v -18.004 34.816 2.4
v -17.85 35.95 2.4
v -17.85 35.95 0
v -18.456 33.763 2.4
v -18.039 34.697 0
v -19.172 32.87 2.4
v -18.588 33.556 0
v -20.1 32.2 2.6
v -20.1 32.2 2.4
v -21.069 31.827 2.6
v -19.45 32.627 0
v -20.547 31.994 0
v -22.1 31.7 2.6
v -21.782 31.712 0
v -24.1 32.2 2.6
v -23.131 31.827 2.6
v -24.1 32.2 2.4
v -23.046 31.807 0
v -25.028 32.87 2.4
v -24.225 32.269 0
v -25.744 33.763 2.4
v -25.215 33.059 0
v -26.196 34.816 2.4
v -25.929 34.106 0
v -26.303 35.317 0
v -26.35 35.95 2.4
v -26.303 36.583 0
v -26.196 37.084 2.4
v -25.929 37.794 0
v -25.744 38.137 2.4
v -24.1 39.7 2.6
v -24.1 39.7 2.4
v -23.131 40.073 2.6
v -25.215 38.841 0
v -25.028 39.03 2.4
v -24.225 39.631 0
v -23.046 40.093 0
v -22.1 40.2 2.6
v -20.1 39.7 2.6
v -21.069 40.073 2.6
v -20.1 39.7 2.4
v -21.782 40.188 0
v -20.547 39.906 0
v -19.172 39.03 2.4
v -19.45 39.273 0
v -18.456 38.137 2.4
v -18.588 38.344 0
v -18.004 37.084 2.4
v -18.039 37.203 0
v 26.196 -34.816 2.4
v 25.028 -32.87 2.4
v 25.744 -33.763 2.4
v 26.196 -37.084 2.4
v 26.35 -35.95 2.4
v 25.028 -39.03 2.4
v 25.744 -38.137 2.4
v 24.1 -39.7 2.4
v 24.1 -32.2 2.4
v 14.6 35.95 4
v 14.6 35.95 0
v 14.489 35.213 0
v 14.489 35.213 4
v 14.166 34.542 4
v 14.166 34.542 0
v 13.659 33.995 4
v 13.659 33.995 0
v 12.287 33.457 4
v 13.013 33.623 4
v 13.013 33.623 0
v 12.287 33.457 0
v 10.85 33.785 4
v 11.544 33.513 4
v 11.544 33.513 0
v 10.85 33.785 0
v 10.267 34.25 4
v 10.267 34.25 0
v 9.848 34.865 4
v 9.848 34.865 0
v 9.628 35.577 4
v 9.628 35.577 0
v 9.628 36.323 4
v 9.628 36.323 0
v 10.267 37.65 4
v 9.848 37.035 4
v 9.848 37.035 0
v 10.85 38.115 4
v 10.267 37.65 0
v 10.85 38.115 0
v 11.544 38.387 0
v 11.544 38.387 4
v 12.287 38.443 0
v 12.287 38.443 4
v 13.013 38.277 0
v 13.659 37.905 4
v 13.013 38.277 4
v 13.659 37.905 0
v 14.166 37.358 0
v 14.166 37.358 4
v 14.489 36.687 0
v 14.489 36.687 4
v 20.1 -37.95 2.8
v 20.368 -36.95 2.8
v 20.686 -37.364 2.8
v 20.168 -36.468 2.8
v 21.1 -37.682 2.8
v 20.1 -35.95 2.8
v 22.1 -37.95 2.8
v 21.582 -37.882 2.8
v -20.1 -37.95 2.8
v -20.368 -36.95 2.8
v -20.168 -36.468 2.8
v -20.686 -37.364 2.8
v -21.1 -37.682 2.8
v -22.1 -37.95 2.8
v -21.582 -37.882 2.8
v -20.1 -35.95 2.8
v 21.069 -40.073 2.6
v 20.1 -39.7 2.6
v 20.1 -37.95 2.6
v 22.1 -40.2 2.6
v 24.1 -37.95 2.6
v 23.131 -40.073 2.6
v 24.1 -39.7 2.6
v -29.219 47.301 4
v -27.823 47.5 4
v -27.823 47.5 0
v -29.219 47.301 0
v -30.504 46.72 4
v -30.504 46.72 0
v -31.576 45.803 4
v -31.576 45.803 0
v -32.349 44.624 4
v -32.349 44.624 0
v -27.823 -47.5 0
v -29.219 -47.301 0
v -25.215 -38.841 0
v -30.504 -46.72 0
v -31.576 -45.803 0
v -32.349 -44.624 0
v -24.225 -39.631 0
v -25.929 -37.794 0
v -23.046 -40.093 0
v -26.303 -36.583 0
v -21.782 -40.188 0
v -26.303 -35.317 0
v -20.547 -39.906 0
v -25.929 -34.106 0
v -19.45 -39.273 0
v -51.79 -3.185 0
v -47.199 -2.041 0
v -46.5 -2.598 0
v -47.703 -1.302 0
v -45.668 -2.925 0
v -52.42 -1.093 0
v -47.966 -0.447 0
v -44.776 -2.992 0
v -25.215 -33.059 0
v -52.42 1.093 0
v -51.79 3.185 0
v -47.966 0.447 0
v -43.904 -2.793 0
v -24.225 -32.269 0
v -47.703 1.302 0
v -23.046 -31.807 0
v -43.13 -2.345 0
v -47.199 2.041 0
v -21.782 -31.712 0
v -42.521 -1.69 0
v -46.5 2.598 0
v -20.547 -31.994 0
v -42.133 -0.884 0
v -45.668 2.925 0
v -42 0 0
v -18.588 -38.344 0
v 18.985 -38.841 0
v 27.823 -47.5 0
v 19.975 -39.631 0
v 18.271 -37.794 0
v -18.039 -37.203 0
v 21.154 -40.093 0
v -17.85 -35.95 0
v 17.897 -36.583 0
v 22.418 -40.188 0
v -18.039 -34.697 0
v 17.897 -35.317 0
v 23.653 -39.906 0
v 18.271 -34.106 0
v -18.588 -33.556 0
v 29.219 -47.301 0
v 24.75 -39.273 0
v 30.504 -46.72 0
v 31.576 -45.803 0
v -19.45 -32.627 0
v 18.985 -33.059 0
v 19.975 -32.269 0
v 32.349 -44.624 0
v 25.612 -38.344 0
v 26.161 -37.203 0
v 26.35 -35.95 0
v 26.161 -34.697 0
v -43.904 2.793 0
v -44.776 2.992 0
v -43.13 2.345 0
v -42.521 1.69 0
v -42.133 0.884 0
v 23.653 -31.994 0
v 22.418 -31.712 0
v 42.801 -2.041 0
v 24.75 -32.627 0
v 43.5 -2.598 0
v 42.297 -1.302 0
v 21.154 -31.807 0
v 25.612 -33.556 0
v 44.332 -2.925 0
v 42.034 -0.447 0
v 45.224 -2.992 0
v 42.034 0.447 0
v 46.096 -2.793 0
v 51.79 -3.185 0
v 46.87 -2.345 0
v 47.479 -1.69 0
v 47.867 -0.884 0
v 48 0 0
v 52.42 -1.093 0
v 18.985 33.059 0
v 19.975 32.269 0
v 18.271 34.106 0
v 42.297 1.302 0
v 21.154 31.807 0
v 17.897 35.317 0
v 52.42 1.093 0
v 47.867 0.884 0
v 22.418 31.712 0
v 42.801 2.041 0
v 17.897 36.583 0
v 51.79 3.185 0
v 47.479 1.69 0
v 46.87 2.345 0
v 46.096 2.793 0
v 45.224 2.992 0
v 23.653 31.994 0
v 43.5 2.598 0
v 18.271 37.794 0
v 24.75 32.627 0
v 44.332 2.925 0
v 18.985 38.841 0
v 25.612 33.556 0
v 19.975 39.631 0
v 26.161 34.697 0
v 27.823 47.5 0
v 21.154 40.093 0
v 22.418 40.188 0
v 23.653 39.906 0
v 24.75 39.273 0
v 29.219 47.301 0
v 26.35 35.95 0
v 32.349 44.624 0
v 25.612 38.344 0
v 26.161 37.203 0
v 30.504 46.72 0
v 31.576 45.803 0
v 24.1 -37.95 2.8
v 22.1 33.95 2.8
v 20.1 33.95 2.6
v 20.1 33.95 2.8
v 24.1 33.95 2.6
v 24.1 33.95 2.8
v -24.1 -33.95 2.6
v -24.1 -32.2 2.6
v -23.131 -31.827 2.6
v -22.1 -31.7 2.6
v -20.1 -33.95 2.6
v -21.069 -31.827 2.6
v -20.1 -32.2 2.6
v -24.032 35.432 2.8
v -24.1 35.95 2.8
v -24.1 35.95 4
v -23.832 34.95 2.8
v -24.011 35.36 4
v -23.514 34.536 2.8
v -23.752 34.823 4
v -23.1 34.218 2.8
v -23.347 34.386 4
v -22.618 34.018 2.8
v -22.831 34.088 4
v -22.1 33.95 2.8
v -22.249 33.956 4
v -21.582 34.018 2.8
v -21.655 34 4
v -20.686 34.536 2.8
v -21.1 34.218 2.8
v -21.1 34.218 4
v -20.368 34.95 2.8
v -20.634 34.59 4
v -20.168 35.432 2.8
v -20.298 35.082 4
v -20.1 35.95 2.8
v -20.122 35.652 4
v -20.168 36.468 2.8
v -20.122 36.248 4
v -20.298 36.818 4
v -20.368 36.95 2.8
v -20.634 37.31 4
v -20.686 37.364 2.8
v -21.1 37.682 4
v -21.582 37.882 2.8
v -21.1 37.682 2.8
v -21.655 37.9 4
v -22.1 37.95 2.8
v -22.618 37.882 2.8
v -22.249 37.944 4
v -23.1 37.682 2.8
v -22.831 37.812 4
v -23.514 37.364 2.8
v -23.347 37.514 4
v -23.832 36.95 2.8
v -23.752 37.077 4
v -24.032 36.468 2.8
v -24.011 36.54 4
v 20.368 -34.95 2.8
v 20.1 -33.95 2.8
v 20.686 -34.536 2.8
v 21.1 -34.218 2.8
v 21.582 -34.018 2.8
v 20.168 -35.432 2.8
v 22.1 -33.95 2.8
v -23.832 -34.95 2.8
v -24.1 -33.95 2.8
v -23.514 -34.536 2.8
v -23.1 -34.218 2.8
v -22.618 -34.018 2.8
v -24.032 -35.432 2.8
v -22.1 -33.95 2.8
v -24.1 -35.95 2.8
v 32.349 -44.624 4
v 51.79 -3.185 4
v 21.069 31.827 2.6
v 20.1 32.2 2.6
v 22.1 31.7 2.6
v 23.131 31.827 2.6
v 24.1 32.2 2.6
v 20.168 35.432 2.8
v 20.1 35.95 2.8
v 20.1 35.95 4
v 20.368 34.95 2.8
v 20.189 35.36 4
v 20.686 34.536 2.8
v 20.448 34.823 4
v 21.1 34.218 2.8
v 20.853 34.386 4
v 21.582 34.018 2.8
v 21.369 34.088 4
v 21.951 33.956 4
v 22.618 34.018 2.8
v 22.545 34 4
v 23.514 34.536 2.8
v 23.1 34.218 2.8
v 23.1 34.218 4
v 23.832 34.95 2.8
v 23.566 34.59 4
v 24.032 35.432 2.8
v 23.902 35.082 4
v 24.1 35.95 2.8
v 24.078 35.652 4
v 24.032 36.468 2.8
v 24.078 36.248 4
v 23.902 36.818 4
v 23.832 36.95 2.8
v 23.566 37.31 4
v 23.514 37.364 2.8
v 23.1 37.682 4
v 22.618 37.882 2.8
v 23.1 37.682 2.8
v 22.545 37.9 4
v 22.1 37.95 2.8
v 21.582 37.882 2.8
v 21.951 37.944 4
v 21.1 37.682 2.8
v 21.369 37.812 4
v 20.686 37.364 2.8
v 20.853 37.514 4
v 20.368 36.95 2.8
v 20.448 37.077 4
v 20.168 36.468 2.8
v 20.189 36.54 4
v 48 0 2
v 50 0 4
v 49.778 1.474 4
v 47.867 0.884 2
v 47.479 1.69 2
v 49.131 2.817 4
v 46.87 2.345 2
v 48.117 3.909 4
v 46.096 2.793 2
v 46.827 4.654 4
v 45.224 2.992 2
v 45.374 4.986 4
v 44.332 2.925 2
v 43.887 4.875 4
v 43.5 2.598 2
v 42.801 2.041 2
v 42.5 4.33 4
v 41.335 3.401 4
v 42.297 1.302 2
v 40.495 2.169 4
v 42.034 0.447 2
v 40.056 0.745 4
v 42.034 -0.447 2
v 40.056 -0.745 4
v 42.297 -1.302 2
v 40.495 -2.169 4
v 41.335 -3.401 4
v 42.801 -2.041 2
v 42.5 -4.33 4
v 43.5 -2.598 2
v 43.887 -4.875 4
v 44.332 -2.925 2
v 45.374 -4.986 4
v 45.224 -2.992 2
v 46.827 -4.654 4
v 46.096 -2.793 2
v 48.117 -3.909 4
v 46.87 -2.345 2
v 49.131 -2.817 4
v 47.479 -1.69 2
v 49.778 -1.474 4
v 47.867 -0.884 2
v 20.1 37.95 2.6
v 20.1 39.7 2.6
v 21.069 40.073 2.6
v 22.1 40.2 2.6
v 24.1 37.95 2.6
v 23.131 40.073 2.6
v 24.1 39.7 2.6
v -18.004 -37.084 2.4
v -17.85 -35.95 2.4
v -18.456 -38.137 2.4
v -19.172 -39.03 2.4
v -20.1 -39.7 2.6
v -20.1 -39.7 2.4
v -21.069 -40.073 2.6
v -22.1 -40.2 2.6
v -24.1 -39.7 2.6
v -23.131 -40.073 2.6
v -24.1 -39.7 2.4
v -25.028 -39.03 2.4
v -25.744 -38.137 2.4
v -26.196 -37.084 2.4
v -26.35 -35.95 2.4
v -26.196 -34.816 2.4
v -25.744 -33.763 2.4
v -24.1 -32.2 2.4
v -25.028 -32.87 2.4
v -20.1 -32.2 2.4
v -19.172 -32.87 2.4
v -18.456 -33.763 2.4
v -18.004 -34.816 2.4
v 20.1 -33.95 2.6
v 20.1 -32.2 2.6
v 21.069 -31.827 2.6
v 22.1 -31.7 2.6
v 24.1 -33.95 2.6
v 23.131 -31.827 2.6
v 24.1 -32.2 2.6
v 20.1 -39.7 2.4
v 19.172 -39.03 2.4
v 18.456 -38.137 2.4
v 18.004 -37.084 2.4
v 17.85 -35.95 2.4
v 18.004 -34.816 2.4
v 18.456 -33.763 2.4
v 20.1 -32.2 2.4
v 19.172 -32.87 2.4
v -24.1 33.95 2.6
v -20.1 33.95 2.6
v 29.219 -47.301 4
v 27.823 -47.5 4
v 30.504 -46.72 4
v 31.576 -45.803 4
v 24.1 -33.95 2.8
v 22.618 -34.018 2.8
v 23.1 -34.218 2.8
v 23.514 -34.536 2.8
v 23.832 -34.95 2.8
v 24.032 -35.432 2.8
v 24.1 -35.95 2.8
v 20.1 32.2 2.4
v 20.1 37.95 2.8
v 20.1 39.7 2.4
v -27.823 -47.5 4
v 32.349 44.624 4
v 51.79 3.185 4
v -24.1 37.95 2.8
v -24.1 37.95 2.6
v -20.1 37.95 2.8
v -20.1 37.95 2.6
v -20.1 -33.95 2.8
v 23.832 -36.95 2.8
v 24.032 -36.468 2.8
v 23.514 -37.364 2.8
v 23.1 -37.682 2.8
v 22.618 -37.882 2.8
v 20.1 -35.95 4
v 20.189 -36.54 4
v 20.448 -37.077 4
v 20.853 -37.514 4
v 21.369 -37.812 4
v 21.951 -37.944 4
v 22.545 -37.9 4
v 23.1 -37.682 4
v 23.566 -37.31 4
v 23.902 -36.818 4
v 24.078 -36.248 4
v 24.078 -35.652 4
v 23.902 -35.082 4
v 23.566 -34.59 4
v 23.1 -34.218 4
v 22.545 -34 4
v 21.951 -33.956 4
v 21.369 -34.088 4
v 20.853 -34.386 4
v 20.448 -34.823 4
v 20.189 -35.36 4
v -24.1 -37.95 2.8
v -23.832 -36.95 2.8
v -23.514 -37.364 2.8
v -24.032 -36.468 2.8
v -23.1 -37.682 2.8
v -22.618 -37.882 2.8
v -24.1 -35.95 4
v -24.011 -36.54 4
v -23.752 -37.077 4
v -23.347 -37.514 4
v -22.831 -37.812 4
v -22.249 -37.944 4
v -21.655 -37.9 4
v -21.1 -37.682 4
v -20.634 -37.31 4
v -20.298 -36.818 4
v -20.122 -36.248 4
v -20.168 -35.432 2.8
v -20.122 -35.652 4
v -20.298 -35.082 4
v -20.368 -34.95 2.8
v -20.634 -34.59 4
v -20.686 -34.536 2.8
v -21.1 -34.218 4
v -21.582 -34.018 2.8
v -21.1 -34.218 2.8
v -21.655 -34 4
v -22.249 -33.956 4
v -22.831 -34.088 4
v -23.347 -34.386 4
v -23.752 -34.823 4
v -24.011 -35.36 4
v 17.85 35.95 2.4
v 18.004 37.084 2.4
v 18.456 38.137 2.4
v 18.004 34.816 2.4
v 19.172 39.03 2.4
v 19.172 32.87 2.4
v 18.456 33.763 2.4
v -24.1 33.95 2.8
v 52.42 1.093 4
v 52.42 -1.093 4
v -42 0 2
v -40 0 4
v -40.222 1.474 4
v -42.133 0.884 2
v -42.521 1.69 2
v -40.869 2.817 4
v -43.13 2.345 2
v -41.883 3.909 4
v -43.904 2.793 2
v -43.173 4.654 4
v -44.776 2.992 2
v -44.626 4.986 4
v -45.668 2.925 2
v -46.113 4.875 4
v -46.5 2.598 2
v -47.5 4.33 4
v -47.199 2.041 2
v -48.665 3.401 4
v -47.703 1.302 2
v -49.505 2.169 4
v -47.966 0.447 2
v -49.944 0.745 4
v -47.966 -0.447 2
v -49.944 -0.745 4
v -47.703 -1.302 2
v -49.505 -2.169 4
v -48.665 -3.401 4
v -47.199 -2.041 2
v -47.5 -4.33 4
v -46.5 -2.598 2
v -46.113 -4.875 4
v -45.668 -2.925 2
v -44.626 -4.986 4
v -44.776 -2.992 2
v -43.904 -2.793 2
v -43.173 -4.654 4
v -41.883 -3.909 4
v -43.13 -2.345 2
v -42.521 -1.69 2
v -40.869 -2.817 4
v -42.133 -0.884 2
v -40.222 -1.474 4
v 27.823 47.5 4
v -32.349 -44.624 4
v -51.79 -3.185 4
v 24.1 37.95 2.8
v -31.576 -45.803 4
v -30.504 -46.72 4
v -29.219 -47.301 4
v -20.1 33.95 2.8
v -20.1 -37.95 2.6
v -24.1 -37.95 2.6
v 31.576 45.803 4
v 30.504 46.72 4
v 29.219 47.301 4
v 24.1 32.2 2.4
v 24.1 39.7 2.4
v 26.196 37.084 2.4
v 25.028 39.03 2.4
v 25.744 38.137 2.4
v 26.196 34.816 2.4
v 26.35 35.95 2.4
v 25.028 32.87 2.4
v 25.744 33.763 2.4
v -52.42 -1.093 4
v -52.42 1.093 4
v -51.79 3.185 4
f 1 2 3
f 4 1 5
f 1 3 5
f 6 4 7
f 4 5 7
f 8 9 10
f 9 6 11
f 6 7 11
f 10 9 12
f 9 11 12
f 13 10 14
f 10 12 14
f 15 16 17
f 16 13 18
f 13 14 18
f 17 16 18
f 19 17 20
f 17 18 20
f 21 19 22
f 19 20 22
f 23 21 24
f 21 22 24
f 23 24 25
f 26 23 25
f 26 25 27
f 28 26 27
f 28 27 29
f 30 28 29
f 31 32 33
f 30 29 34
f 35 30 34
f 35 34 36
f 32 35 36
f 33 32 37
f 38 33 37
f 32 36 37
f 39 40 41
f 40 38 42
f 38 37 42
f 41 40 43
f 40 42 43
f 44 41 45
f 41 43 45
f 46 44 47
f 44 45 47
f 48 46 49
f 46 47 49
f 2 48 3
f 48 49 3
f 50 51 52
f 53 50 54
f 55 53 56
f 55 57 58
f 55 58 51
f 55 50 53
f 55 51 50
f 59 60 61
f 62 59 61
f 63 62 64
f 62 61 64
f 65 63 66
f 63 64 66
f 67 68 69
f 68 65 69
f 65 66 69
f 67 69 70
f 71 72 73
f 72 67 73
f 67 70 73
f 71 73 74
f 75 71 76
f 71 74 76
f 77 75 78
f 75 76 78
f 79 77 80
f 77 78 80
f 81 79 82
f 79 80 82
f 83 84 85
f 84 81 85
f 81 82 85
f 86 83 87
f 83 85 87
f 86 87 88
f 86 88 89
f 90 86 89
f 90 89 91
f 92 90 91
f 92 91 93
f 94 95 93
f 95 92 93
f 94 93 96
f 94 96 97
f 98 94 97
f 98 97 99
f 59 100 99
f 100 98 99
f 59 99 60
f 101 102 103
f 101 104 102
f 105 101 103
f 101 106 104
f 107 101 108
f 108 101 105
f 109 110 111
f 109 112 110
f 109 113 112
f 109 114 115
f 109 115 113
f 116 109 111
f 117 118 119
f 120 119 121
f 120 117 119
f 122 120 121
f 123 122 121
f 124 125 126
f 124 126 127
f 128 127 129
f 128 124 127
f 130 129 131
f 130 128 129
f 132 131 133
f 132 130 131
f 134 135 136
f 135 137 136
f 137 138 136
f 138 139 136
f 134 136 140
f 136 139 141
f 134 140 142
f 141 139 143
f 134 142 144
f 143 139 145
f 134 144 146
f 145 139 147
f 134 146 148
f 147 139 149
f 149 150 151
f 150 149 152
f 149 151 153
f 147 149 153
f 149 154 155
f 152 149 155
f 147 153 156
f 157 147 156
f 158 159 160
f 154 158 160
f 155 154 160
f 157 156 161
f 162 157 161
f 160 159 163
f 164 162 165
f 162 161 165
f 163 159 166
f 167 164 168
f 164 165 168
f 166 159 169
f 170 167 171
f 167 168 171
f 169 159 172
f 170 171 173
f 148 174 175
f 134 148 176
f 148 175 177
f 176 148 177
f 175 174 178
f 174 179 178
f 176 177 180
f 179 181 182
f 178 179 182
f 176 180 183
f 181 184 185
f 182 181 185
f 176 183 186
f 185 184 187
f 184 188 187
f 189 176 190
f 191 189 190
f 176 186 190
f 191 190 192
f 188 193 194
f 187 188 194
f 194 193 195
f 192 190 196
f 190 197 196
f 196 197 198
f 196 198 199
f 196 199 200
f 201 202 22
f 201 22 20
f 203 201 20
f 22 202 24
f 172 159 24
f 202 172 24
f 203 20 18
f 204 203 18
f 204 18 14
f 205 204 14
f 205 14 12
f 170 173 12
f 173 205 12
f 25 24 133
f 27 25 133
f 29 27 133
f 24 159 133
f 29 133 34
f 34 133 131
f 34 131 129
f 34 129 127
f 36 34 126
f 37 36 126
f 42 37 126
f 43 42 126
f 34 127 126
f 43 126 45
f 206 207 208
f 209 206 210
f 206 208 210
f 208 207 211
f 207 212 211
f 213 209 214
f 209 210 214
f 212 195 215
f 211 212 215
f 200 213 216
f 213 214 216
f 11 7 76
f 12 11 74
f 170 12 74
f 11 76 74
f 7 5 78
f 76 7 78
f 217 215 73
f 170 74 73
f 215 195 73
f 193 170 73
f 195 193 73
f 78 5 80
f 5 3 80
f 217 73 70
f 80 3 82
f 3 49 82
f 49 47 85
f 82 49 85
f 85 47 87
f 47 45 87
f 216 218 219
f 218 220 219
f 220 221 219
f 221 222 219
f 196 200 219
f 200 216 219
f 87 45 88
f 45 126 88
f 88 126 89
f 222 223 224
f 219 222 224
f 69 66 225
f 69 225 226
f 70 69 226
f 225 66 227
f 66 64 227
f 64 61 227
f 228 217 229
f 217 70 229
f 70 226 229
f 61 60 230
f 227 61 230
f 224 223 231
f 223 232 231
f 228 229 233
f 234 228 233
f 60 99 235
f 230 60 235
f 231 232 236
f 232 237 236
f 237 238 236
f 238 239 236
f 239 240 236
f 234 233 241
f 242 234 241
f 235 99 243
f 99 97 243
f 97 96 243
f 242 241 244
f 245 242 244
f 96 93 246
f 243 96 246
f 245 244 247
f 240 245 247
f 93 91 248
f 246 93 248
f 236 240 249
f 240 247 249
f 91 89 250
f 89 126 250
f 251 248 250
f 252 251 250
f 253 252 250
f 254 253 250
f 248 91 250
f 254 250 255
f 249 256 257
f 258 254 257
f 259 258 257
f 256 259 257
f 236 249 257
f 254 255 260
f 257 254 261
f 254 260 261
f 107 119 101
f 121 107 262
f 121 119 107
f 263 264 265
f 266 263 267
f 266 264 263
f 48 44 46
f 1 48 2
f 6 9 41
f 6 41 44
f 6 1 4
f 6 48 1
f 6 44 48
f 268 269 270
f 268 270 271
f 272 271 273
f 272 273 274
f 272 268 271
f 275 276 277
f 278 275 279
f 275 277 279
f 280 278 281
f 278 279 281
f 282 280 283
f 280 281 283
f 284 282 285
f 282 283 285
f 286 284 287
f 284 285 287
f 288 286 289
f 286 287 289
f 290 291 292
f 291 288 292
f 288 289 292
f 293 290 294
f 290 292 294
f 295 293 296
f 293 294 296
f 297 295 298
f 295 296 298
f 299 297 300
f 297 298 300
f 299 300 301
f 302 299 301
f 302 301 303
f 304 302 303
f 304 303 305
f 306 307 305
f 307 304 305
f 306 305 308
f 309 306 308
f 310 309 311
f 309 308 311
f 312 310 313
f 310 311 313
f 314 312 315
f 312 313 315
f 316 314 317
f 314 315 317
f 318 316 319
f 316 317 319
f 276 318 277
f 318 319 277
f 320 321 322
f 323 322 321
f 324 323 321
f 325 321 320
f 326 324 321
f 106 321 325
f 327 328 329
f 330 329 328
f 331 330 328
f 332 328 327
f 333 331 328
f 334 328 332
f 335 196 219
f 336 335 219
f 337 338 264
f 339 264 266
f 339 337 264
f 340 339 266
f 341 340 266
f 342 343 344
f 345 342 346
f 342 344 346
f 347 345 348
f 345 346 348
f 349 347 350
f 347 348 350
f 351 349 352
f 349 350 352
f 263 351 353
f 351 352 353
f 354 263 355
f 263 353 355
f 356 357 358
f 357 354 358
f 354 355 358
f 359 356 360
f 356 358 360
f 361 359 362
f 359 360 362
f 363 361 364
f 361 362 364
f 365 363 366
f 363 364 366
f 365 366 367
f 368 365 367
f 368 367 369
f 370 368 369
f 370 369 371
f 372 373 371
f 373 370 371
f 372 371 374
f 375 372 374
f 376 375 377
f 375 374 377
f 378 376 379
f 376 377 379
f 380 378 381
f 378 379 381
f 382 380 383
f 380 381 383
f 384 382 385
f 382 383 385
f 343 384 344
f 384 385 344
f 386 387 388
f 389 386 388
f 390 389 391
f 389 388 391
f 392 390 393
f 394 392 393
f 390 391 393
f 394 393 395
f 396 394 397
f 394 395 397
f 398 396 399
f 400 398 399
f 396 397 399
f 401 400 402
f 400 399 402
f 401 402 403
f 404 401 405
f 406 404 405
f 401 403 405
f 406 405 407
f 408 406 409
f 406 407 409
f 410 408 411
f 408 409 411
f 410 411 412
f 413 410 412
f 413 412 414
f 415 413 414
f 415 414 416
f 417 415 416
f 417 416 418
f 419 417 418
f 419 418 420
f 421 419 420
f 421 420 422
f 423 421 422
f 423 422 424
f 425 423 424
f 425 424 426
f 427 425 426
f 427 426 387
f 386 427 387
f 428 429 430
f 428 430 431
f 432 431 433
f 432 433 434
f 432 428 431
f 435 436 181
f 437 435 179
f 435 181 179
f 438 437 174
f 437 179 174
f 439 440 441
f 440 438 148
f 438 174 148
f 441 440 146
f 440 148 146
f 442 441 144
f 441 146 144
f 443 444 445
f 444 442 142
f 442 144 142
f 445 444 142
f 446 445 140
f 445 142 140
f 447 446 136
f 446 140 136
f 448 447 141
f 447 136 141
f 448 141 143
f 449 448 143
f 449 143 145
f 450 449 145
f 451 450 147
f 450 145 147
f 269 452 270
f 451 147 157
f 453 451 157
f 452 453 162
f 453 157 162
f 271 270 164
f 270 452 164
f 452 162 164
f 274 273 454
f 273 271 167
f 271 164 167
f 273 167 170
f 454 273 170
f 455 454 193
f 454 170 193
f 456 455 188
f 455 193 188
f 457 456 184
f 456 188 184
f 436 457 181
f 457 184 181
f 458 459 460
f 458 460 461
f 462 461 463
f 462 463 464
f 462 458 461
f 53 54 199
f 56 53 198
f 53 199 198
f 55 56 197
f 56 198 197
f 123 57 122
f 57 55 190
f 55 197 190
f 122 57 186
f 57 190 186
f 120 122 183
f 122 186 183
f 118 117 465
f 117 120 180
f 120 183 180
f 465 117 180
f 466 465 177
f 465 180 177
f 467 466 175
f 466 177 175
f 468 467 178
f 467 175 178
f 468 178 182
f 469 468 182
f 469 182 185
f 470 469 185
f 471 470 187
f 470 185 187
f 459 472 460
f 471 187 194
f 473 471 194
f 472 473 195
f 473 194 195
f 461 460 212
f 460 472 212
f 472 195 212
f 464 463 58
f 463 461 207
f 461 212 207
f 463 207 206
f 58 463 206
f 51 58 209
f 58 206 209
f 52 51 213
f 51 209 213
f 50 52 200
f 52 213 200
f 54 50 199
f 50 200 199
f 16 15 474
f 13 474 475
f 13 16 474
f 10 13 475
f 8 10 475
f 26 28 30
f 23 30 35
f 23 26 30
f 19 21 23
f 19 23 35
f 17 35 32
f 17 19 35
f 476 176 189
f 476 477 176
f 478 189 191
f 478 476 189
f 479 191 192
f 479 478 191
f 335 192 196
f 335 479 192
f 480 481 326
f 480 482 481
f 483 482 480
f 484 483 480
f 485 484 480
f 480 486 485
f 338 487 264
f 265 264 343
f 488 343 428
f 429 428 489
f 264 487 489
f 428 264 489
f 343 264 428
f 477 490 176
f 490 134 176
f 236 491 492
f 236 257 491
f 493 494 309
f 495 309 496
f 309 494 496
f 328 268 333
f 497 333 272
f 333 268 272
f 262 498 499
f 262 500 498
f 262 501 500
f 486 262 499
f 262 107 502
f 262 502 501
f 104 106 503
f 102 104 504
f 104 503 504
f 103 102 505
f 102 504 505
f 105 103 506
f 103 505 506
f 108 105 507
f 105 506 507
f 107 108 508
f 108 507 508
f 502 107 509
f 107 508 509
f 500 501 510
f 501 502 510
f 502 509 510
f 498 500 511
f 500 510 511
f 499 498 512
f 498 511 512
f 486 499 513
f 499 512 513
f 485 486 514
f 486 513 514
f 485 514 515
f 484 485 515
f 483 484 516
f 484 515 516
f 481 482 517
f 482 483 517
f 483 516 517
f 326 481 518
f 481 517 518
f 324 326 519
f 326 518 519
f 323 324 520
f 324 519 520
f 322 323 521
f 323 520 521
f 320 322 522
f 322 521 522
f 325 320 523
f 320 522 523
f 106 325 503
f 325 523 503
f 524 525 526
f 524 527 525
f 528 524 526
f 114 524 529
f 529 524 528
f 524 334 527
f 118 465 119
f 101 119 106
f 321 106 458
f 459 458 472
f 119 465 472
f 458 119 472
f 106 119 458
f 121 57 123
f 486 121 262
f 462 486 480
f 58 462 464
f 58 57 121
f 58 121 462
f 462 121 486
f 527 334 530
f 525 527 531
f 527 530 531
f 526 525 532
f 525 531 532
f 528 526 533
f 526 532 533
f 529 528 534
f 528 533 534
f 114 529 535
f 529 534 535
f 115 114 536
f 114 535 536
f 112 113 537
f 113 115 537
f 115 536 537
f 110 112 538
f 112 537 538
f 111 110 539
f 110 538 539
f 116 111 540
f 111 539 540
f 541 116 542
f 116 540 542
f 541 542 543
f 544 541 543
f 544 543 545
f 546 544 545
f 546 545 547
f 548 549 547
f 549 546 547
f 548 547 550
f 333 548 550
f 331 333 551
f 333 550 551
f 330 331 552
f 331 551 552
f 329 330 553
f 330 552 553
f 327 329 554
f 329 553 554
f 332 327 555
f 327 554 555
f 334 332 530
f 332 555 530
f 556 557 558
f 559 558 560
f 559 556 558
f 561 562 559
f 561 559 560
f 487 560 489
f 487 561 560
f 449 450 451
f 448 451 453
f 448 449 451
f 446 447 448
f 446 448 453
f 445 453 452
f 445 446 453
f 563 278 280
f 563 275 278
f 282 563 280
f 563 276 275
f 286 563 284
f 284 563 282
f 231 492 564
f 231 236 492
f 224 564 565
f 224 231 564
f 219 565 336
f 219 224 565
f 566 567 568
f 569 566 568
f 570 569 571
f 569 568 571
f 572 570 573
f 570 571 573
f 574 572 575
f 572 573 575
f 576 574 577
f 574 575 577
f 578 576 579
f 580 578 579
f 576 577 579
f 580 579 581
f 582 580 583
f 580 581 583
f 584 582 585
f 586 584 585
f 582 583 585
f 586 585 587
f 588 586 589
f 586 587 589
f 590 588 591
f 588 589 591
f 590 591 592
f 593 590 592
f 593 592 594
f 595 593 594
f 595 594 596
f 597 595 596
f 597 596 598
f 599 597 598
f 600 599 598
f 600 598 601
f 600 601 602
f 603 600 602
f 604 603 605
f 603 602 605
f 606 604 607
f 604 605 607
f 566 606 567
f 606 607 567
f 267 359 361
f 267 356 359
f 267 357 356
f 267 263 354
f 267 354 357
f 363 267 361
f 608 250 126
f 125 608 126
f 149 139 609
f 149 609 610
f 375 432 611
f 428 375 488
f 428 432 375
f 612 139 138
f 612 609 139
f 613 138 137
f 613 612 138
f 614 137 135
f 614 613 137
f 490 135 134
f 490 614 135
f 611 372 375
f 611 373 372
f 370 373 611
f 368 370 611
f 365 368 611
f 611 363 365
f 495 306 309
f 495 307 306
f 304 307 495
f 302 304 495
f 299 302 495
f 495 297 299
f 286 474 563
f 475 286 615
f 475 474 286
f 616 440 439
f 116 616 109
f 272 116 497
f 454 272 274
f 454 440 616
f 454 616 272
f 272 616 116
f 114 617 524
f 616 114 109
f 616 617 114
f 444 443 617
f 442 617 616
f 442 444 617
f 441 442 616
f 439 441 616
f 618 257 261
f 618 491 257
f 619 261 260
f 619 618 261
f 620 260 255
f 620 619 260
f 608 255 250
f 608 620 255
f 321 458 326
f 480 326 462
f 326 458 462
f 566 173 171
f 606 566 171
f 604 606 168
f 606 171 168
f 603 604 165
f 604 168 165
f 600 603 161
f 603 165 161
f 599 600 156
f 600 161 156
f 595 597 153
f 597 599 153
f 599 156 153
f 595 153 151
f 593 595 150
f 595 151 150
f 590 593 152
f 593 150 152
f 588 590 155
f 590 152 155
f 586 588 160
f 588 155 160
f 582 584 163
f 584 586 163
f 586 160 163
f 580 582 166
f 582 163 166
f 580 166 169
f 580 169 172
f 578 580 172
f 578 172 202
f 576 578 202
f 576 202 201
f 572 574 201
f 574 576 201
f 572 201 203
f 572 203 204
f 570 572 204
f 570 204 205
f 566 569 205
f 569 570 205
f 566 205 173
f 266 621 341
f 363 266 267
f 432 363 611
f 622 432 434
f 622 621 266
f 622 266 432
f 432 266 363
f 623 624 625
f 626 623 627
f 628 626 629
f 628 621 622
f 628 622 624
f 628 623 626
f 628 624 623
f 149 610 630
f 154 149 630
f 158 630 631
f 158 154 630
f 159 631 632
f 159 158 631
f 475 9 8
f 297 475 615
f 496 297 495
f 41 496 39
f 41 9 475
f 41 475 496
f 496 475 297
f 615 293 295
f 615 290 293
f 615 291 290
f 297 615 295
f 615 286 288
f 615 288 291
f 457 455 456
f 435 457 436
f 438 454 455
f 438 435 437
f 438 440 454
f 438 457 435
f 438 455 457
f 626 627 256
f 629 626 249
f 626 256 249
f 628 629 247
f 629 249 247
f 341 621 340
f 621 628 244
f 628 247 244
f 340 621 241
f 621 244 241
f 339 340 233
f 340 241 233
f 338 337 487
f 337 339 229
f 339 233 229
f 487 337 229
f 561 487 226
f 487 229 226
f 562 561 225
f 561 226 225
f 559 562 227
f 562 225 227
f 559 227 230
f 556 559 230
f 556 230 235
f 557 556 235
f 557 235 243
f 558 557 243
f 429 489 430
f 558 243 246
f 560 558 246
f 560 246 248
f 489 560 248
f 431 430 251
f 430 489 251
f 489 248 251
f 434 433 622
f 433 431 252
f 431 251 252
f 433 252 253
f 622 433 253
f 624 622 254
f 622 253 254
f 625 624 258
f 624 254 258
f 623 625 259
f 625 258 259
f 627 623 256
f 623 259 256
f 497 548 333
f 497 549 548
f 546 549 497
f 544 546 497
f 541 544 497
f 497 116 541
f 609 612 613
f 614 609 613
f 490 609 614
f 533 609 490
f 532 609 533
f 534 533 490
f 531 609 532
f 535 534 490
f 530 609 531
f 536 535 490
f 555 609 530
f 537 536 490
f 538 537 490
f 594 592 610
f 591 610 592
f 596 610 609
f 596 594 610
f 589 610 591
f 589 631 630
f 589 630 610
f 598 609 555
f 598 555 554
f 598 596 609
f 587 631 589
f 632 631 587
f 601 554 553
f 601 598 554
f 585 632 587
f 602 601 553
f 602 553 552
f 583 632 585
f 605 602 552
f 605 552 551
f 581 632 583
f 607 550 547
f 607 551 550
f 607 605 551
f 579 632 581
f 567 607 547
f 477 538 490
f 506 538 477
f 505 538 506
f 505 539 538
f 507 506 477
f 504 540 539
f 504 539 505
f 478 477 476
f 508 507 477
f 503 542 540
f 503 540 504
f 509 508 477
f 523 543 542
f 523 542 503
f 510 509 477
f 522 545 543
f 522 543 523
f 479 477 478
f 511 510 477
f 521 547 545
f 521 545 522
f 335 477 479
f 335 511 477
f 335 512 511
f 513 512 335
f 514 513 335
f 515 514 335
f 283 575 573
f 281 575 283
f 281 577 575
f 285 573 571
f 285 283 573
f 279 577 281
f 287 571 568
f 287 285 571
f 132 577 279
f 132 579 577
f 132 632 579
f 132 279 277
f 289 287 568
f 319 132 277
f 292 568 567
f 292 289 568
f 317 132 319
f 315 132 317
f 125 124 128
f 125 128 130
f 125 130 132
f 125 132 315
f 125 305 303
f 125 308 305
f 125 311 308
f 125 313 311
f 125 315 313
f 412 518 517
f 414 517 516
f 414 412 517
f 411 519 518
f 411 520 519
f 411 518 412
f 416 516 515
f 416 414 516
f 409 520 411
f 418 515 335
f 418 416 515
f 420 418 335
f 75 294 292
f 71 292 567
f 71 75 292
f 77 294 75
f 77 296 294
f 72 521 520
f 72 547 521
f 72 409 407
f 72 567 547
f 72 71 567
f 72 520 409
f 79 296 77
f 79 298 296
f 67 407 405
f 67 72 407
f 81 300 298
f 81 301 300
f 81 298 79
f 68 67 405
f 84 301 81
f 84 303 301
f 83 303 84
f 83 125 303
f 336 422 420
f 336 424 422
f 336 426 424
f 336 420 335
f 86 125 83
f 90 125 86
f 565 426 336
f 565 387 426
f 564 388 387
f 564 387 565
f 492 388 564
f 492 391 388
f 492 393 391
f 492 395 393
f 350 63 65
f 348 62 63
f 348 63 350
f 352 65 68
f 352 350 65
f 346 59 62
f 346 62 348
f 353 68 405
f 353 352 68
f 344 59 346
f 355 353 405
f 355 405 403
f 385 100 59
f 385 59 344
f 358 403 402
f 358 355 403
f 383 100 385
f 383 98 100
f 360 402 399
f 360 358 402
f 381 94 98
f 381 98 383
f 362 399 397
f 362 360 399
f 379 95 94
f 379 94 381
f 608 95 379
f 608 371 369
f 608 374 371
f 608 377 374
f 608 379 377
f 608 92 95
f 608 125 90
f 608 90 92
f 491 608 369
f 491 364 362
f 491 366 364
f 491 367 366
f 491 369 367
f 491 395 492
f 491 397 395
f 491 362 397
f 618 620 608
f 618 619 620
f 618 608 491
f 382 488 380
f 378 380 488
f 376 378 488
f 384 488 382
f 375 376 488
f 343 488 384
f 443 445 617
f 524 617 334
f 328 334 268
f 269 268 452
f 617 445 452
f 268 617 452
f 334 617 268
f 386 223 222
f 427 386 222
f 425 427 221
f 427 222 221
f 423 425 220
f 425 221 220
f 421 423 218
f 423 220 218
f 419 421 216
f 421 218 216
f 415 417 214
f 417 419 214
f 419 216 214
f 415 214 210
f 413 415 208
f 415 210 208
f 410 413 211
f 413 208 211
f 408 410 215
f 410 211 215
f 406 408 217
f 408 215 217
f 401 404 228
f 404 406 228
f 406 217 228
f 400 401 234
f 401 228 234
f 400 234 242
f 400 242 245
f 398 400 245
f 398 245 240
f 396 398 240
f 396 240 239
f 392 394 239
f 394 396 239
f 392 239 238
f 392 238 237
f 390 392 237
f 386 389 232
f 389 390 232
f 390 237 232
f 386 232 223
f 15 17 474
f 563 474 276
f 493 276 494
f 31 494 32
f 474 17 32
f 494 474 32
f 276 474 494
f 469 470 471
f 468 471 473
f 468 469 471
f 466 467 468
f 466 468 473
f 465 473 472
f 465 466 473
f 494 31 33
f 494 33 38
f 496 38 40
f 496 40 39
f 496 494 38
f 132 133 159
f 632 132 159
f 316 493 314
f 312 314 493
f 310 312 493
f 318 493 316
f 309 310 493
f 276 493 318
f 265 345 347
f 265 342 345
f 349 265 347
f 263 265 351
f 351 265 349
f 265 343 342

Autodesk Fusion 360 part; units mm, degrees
sketch "Sketch1" plane through (0, 0, 0) normal (0, 0, 1) x (1, 0, 0)
  line L0 (22.1, 35.95) -> (-22.1, 35.95) construction
  line L1 (-22.1, 35.95) -> (-22.1, -35.95) construction
  line L2 (-22.1, -35.95) -> (22.1, -35.95) construction
  line L3 (22.1, -35.95) -> (22.1, 35.95) construction
  line L4 (22.1, 35.95) -> (-22.1, -35.95) construction
  line L5 (-22.1, 35.95) -> (22.1, -35.95) construction
  line L6 (23.8, 37.65) -> (-23.8, 37.65) construction
  line L7 (-23.8, 37.65) -> (-23.8, -37.65) construction
  line L8 (-23.8, -37.65) -> (23.8, -37.65) construction
  line L9 (23.8, -37.65) -> (23.8, 37.65) construction
  line L10 (23.8, 37.65) -> (-23.8, -37.65) construction
  line L11 (-23.8, 37.65) -> (23.8, -37.65) construction
  circle A0 centre (-22.1, 35.95) radius 1.7
  circle A1 centre (22.1, 35.95) radius 1.7
  circle A2 centre (-22.1, -35.95) radius 1.7
  circle A3 centre (22.1, -35.95) radius 1.7
  line L12 (-23.8, -34.25) -> (23.8, -34.25) construction
  line L13 (-20.4, -37.65) -> (-20.4, 37.65) construction
  line L14 (-23.8, 34.25) -> (23.8, 34.25) construction
  line L15 (20.4, 37.65) -> (20.4, -37.65) construction
  line L16 (31, 47.5) -> (-31, 47.5)
  line L17 (-31, 47.5) -> (-31, -47.5)
  line L18 (-31, -47.5) -> (31, -47.5)
  line L19 (31, -47.5) -> (31, 47.5)
  line L20 (31, 47.5) -> (-31, -47.5) construction
  line L21 (-31, 47.5) -> (31, -47.5) construction
  circle A4 centre (-45, 0) radius 3
  circle A5 centre (45, 0) radius 3
  circle A6 centre (-45, 0) radius 7.5
  circle A7 centre (45, 0) radius 7.5
  line L22 (-31, 47.5) -> (-51.7899, 3.1854)
  line L23 (-31, -47.5) -> (-51.7899, -3.1854)
  line L24 (31, -47.5) -> (51.7899, -3.1854)
  line L25 (31, 47.5) -> (51.7899, 3.1854)
  line L26 (45, 0) -> (0, 0) construction
  line L27 (0, 0) -> (-45, 0) construction
  circle A8 centre (12.1, 35.95) radius 2.5
  dimension "d1" = 75.3
  dimension "d2" = 68.5
  dimension "d3" = 40.8
  dimension "d4" = 47.6
  dimension "d5" = 95
  dimension "d6" = 62
  dimension "d7" = 6
  dimension "d8" = 6
  dimension "d9" = 15
  dimension "d10" = 15
  dimension "d11" = 45
  dimension "d12" = 45
  dimension "d13" = 10
  dimension "d14" = 5
extrude "Extrude1" add sketch "Sketch1" along normal blind 4
fillet "Fillet1" radius 5 4 edges at (31, 47.5, 2) (-31, 47.5, 2) (31, -47.5, 2) (-31, -47.5, 2)
sketch "Sketch2" plane through (0, 0, 0) normal (0, 0, -1) x (1, 0, 0)
  circle A0 centre (45, 0) radius 3
  circle A1 centre (-22.1, 35.95) radius 1.7
  circle A2 centre (22.1, 35.95) radius 1.7
  circle A3 centre (-22.1, -35.95) radius 1.7
  circle A4 centre (-45, 0) radius 3
  circle A5 centre (22.1, -35.95) radius 1.7
  circle A6 centre (12.1, -35.95) radius 2.5
  arc A7 (-27.8228, 47.5) -> (-32.3494, 44.6236) centre (-27.8228, 42.5) ccw
  line L0 (-32.3494, 44.6236) -> (-51.7899, 3.1854)
  arc A8 (-51.7899, 3.1854) -> (-51.7899, -3.1854) centre (-45, 0) ccw
  line L1 (-51.7899, -3.1854) -> (-32.3494, -44.6236)
  arc A9 (-32.3494, -44.6236) -> (-27.8228, -47.5) centre (-27.8228, -42.5) ccw
  line L2 (-27.8228, -47.5) -> (27.8228, -47.5)
  arc A10 (27.8228, -47.5) -> (32.3494, -44.6236) centre (27.8228, -42.5) ccw
  line L3 (32.3494, -44.6236) -> (51.7899, -3.1854)
  arc A11 (51.7899, -3.1854) -> (51.7899, 3.1854) centre (45, 0) ccw
  line L4 (51.7899, 3.1854) -> (32.3494, 44.6236)
  arc A12 (32.3494, 44.6236) -> (27.8228, 47.5) centre (27.8228, 42.5) ccw
  line L5 (27.8228, 47.5) -> (-27.8228, 47.5)
  circle A13 centre (22.1, -35.95) radius 4.25
  circle A14 centre (-22.1, -35.95) radius 4.25
  circle A15 centre (-22.1, 35.95) radius 4.25
  circle A16 centre (22.1, 35.95) radius 4.25
  dimension "d19" = 8.5
  dimension "d20" = 8.5
  dimension "d21" = 8.5
  dimension "d22" = 8.5
extrude "Extrude2" cut sketch "Sketch2" against normal blind 2.4 contours A13 | A14 | A15 | A16
sketch "Sketch3" plane through (0, 0, 4) normal (0, 0, 1) x (-1, 0, 0)
  arc A0 (32.3494, 44.6236) -> (27.8228, 47.5) centre (27.8228, 42.5) ccw
  line L0 (27.8228, 47.5) -> (-27.8228, 47.5)
  arc A1 (-27.8228, 47.5) -> (-32.3494, 44.6236) centre (-27.8228, 42.5) ccw
  line L1 (-32.3494, 44.6236) -> (-51.7899, 3.1854)
  arc A2 (-51.7899, 3.1854) -> (-51.7899, -3.1854) centre (-45, 0) ccw
  line L2 (-51.7899, -3.1854) -> (-32.3494, -44.6236)
  arc A3 (-32.3494, -44.6236) -> (-27.8228, -47.5) centre (-27.8228, -42.5) ccw
  line L3 (-27.8228, -47.5) -> (27.8228, -47.5)
  arc A4 (27.8228, -47.5) -> (32.3494, -44.6236) centre (27.8228, -42.5) ccw
  line L4 (32.3494, -44.6236) -> (51.7899, -3.1854)
  arc A5 (51.7899, -3.1854) -> (51.7899, 3.1854) centre (45, 0) ccw
  line L5 (51.7899, 3.1854) -> (32.3494, 44.6236)
  circle A6 centre (-45, 0) radius 3
  circle A7 centre (22.1, 35.95) radius 1.7
  circle A8 centre (-22.1, 35.95) radius 1.7
  circle A9 centre (22.1, -35.95) radius 1.7
  circle A10 centre (45, 0) radius 3
  circle A11 centre (-22.1, -35.95) radius 1.7
  circle A12 centre (-12.1, -35.95) radius 2.5
  circle A13 centre (22.1, -35.95) radius 2
  circle A14 centre (-22.1, -35.95) radius 2
  circle A15 centre (-22.1, 35.95) radius 2
  circle A16 centre (22.1, 35.95) radius 2
  dimension "d25" = 4
  dimension "d26" = 4
  dimension "d27" = 4
  dimension "d28" = 4
extrude "Extrude3" cut sketch "Sketch3" against normal up to surface (1.6 mm away) contours A13 | A14 | A15 | A16
sketch "Sketch4" plane through (0, 0, 2.4) normal (0, 0, -1) x (1, 0, 0)
  circle A0 centre (-22.1, -35.95) radius 2
  circle A1 centre (-22.1, -35.95) radius 4.25
  circle A2 centre (-22.1, 35.95) radius 2
  circle A3 centre (-22.1, 35.95) radius 4.25
  circle A4 centre (22.1, 35.95) radius 2
  circle A5 centre (22.1, 35.95) radius 4.25
  circle A6 centre (22.1, -35.95) radius 2
  circle A7 centre (22.1, -35.95) radius 4.25
  line L0 (-24.1, 39.7) -> (-24.1, 32.2)
  line L1 (-20.1, 39.7) -> (-20.1, 32.2)
  line L2 (20.1, 39.7) -> (20.1, 32.2)
  line L3 (24.1, 39.7) -> (24.1, 32.2)
  line L4 (24.1, -32.2) -> (24.1, -39.7)
  line L5 (20.1, -32.2) -> (20.1, -39.7)
  line L6 (-20.1, -32.2) -> (-20.1, -39.7)
  line L7 (-24.1, -32.2) -> (-24.1, -39.7)
extrude "Extrude4" cut sketch "Sketch4" against normal blind 0.2 contours A0 A1 L6 L7 | A0 A1 L6 L7 | A2 A3 L0 L1 | A2 A3 L0 L1 | A4 A5 L2 L3 | A4 A5 L2 L3 | A6 A7 L4 L5 | A6 A7 L4 L5
sketch "Sketch5" plane through (0, 0, 2.6) normal (0, 0, -1) x (1, 0, 0)
  line L0 (-24.1, 39.7) -> (-24.1, 35.95)
  arc A0 (-20.1, 35.95) -> (-24.1, 35.95) centre (-22.1, 35.95) ccw
  line L1 (-20.1, 35.95) -> (-20.1, 39.7)
  arc A1 (-20.1, 39.7) -> (-24.1, 39.7) centre (-22.1, 35.95) ccw
  arc A2 (20.1, 32.2) -> (24.1, 32.2) centre (22.1, 35.95) ccw
  line L2 (24.1, 32.2) -> (24.1, 35.95)
  arc A3 (20.1, 35.95) -> (24.1, 35.95) centre (22.1, 35.95) ccw
  line L3 (20.1, 35.95) -> (20.1, 32.2)
  line L4 (20.1, 39.7) -> (20.1, 35.95)
  arc A4 (24.1, 35.95) -> (20.1, 35.95) centre (22.1, 35.95) ccw
  line L5 (24.1, 35.95) -> (24.1, 39.7)
  arc A5 (24.1, 39.7) -> (20.1, 39.7) centre (22.1, 35.95) ccw
  arc A6 (-24.1, 32.2) -> (-20.1, 32.2) centre (-22.1, 35.95) ccw
  line L6 (-20.1, 32.2) -> (-20.1, 35.95)
  arc A7 (-24.1, 35.95) -> (-20.1, 35.95) centre (-22.1, 35.95) ccw
  line L7 (-24.1, 35.95) -> (-24.1, 32.2)
  line L8 (20.1, -35.95) -> (20.1, -39.7)
  arc A8 (20.1, -39.7) -> (24.1, -39.7) centre (22.1, -35.95) ccw
  line L9 (24.1, -39.7) -> (24.1, -35.95)
  arc A9 (20.1, -35.95) -> (24.1, -35.95) centre (22.1, -35.95) ccw
  arc A10 (24.1, -32.2) -> (20.1, -32.2) centre (22.1, -35.95) ccw
  line L10 (20.1, -32.2) -> (20.1, -35.95)
  arc A11 (24.1, -35.95) -> (20.1, -35.95) centre (22.1, -35.95) ccw
  line L11 (24.1, -35.95) -> (24.1, -32.2)
  line L12 (-24.1, -35.95) -> (-24.1, -39.7)
  arc A12 (-24.1, -39.7) -> (-20.1, -39.7) centre (-22.1, -35.95) ccw
  line L13 (-20.1, -39.7) -> (-20.1, -35.95)
  arc A13 (-24.1, -35.95) -> (-20.1, -35.95) centre (-22.1, -35.95) ccw
  arc A14 (-20.1, -32.2) -> (-24.1, -32.2) centre (-22.1, -35.95) ccw
  line L14 (-24.1, -32.2) -> (-24.1, -35.95)
  arc A15 (-20.1, -35.95) -> (-24.1, -35.95) centre (-22.1, -35.95) ccw
  line L15 (-20.1, -35.95) -> (-20.1, -32.2)
  line L16 (-24.1, 37.95) -> (-20.1, 37.95)
  line L17 (-24.1, 33.95) -> (-20.1, 33.95)
  line L18 (20.1, 37.95) -> (24.1, 37.95)
  line L19 (20.1, 33.95) -> (24.1, 33.95)
  line L20 (20.1, -33.95) -> (24.1, -33.95)
  line L21 (24.1, -37.95) -> (20.1, -37.95)
  line L22 (-24.1, -33.95) -> (-20.1, -33.95)
  line L23 (-24.1, -37.95) -> (-20.1, -37.95)
extrude "Extrude5" cut sketch "Sketch5" against normal blind 0.2 contours L0 A0 L16 | A7 L7 L17 | A0 L1 L16 | L6 A7 L17 | A3 L3 L19 | L2 A3 L19 | L4 A4 L18 | A4 L5 L18 | L8 A9 L21 | L10 A11 L20 | L9 A9 L21 | A11 L11 L20 | L12 A13 L23 | L14 A15 L22 | L13 A13 L23 | A15 L15 L22
chamfer "Chamfer1" distance 2 angle 45 2 edges at (-47.797, 1.0848, 4) (42.203, 1.0848, 4)
